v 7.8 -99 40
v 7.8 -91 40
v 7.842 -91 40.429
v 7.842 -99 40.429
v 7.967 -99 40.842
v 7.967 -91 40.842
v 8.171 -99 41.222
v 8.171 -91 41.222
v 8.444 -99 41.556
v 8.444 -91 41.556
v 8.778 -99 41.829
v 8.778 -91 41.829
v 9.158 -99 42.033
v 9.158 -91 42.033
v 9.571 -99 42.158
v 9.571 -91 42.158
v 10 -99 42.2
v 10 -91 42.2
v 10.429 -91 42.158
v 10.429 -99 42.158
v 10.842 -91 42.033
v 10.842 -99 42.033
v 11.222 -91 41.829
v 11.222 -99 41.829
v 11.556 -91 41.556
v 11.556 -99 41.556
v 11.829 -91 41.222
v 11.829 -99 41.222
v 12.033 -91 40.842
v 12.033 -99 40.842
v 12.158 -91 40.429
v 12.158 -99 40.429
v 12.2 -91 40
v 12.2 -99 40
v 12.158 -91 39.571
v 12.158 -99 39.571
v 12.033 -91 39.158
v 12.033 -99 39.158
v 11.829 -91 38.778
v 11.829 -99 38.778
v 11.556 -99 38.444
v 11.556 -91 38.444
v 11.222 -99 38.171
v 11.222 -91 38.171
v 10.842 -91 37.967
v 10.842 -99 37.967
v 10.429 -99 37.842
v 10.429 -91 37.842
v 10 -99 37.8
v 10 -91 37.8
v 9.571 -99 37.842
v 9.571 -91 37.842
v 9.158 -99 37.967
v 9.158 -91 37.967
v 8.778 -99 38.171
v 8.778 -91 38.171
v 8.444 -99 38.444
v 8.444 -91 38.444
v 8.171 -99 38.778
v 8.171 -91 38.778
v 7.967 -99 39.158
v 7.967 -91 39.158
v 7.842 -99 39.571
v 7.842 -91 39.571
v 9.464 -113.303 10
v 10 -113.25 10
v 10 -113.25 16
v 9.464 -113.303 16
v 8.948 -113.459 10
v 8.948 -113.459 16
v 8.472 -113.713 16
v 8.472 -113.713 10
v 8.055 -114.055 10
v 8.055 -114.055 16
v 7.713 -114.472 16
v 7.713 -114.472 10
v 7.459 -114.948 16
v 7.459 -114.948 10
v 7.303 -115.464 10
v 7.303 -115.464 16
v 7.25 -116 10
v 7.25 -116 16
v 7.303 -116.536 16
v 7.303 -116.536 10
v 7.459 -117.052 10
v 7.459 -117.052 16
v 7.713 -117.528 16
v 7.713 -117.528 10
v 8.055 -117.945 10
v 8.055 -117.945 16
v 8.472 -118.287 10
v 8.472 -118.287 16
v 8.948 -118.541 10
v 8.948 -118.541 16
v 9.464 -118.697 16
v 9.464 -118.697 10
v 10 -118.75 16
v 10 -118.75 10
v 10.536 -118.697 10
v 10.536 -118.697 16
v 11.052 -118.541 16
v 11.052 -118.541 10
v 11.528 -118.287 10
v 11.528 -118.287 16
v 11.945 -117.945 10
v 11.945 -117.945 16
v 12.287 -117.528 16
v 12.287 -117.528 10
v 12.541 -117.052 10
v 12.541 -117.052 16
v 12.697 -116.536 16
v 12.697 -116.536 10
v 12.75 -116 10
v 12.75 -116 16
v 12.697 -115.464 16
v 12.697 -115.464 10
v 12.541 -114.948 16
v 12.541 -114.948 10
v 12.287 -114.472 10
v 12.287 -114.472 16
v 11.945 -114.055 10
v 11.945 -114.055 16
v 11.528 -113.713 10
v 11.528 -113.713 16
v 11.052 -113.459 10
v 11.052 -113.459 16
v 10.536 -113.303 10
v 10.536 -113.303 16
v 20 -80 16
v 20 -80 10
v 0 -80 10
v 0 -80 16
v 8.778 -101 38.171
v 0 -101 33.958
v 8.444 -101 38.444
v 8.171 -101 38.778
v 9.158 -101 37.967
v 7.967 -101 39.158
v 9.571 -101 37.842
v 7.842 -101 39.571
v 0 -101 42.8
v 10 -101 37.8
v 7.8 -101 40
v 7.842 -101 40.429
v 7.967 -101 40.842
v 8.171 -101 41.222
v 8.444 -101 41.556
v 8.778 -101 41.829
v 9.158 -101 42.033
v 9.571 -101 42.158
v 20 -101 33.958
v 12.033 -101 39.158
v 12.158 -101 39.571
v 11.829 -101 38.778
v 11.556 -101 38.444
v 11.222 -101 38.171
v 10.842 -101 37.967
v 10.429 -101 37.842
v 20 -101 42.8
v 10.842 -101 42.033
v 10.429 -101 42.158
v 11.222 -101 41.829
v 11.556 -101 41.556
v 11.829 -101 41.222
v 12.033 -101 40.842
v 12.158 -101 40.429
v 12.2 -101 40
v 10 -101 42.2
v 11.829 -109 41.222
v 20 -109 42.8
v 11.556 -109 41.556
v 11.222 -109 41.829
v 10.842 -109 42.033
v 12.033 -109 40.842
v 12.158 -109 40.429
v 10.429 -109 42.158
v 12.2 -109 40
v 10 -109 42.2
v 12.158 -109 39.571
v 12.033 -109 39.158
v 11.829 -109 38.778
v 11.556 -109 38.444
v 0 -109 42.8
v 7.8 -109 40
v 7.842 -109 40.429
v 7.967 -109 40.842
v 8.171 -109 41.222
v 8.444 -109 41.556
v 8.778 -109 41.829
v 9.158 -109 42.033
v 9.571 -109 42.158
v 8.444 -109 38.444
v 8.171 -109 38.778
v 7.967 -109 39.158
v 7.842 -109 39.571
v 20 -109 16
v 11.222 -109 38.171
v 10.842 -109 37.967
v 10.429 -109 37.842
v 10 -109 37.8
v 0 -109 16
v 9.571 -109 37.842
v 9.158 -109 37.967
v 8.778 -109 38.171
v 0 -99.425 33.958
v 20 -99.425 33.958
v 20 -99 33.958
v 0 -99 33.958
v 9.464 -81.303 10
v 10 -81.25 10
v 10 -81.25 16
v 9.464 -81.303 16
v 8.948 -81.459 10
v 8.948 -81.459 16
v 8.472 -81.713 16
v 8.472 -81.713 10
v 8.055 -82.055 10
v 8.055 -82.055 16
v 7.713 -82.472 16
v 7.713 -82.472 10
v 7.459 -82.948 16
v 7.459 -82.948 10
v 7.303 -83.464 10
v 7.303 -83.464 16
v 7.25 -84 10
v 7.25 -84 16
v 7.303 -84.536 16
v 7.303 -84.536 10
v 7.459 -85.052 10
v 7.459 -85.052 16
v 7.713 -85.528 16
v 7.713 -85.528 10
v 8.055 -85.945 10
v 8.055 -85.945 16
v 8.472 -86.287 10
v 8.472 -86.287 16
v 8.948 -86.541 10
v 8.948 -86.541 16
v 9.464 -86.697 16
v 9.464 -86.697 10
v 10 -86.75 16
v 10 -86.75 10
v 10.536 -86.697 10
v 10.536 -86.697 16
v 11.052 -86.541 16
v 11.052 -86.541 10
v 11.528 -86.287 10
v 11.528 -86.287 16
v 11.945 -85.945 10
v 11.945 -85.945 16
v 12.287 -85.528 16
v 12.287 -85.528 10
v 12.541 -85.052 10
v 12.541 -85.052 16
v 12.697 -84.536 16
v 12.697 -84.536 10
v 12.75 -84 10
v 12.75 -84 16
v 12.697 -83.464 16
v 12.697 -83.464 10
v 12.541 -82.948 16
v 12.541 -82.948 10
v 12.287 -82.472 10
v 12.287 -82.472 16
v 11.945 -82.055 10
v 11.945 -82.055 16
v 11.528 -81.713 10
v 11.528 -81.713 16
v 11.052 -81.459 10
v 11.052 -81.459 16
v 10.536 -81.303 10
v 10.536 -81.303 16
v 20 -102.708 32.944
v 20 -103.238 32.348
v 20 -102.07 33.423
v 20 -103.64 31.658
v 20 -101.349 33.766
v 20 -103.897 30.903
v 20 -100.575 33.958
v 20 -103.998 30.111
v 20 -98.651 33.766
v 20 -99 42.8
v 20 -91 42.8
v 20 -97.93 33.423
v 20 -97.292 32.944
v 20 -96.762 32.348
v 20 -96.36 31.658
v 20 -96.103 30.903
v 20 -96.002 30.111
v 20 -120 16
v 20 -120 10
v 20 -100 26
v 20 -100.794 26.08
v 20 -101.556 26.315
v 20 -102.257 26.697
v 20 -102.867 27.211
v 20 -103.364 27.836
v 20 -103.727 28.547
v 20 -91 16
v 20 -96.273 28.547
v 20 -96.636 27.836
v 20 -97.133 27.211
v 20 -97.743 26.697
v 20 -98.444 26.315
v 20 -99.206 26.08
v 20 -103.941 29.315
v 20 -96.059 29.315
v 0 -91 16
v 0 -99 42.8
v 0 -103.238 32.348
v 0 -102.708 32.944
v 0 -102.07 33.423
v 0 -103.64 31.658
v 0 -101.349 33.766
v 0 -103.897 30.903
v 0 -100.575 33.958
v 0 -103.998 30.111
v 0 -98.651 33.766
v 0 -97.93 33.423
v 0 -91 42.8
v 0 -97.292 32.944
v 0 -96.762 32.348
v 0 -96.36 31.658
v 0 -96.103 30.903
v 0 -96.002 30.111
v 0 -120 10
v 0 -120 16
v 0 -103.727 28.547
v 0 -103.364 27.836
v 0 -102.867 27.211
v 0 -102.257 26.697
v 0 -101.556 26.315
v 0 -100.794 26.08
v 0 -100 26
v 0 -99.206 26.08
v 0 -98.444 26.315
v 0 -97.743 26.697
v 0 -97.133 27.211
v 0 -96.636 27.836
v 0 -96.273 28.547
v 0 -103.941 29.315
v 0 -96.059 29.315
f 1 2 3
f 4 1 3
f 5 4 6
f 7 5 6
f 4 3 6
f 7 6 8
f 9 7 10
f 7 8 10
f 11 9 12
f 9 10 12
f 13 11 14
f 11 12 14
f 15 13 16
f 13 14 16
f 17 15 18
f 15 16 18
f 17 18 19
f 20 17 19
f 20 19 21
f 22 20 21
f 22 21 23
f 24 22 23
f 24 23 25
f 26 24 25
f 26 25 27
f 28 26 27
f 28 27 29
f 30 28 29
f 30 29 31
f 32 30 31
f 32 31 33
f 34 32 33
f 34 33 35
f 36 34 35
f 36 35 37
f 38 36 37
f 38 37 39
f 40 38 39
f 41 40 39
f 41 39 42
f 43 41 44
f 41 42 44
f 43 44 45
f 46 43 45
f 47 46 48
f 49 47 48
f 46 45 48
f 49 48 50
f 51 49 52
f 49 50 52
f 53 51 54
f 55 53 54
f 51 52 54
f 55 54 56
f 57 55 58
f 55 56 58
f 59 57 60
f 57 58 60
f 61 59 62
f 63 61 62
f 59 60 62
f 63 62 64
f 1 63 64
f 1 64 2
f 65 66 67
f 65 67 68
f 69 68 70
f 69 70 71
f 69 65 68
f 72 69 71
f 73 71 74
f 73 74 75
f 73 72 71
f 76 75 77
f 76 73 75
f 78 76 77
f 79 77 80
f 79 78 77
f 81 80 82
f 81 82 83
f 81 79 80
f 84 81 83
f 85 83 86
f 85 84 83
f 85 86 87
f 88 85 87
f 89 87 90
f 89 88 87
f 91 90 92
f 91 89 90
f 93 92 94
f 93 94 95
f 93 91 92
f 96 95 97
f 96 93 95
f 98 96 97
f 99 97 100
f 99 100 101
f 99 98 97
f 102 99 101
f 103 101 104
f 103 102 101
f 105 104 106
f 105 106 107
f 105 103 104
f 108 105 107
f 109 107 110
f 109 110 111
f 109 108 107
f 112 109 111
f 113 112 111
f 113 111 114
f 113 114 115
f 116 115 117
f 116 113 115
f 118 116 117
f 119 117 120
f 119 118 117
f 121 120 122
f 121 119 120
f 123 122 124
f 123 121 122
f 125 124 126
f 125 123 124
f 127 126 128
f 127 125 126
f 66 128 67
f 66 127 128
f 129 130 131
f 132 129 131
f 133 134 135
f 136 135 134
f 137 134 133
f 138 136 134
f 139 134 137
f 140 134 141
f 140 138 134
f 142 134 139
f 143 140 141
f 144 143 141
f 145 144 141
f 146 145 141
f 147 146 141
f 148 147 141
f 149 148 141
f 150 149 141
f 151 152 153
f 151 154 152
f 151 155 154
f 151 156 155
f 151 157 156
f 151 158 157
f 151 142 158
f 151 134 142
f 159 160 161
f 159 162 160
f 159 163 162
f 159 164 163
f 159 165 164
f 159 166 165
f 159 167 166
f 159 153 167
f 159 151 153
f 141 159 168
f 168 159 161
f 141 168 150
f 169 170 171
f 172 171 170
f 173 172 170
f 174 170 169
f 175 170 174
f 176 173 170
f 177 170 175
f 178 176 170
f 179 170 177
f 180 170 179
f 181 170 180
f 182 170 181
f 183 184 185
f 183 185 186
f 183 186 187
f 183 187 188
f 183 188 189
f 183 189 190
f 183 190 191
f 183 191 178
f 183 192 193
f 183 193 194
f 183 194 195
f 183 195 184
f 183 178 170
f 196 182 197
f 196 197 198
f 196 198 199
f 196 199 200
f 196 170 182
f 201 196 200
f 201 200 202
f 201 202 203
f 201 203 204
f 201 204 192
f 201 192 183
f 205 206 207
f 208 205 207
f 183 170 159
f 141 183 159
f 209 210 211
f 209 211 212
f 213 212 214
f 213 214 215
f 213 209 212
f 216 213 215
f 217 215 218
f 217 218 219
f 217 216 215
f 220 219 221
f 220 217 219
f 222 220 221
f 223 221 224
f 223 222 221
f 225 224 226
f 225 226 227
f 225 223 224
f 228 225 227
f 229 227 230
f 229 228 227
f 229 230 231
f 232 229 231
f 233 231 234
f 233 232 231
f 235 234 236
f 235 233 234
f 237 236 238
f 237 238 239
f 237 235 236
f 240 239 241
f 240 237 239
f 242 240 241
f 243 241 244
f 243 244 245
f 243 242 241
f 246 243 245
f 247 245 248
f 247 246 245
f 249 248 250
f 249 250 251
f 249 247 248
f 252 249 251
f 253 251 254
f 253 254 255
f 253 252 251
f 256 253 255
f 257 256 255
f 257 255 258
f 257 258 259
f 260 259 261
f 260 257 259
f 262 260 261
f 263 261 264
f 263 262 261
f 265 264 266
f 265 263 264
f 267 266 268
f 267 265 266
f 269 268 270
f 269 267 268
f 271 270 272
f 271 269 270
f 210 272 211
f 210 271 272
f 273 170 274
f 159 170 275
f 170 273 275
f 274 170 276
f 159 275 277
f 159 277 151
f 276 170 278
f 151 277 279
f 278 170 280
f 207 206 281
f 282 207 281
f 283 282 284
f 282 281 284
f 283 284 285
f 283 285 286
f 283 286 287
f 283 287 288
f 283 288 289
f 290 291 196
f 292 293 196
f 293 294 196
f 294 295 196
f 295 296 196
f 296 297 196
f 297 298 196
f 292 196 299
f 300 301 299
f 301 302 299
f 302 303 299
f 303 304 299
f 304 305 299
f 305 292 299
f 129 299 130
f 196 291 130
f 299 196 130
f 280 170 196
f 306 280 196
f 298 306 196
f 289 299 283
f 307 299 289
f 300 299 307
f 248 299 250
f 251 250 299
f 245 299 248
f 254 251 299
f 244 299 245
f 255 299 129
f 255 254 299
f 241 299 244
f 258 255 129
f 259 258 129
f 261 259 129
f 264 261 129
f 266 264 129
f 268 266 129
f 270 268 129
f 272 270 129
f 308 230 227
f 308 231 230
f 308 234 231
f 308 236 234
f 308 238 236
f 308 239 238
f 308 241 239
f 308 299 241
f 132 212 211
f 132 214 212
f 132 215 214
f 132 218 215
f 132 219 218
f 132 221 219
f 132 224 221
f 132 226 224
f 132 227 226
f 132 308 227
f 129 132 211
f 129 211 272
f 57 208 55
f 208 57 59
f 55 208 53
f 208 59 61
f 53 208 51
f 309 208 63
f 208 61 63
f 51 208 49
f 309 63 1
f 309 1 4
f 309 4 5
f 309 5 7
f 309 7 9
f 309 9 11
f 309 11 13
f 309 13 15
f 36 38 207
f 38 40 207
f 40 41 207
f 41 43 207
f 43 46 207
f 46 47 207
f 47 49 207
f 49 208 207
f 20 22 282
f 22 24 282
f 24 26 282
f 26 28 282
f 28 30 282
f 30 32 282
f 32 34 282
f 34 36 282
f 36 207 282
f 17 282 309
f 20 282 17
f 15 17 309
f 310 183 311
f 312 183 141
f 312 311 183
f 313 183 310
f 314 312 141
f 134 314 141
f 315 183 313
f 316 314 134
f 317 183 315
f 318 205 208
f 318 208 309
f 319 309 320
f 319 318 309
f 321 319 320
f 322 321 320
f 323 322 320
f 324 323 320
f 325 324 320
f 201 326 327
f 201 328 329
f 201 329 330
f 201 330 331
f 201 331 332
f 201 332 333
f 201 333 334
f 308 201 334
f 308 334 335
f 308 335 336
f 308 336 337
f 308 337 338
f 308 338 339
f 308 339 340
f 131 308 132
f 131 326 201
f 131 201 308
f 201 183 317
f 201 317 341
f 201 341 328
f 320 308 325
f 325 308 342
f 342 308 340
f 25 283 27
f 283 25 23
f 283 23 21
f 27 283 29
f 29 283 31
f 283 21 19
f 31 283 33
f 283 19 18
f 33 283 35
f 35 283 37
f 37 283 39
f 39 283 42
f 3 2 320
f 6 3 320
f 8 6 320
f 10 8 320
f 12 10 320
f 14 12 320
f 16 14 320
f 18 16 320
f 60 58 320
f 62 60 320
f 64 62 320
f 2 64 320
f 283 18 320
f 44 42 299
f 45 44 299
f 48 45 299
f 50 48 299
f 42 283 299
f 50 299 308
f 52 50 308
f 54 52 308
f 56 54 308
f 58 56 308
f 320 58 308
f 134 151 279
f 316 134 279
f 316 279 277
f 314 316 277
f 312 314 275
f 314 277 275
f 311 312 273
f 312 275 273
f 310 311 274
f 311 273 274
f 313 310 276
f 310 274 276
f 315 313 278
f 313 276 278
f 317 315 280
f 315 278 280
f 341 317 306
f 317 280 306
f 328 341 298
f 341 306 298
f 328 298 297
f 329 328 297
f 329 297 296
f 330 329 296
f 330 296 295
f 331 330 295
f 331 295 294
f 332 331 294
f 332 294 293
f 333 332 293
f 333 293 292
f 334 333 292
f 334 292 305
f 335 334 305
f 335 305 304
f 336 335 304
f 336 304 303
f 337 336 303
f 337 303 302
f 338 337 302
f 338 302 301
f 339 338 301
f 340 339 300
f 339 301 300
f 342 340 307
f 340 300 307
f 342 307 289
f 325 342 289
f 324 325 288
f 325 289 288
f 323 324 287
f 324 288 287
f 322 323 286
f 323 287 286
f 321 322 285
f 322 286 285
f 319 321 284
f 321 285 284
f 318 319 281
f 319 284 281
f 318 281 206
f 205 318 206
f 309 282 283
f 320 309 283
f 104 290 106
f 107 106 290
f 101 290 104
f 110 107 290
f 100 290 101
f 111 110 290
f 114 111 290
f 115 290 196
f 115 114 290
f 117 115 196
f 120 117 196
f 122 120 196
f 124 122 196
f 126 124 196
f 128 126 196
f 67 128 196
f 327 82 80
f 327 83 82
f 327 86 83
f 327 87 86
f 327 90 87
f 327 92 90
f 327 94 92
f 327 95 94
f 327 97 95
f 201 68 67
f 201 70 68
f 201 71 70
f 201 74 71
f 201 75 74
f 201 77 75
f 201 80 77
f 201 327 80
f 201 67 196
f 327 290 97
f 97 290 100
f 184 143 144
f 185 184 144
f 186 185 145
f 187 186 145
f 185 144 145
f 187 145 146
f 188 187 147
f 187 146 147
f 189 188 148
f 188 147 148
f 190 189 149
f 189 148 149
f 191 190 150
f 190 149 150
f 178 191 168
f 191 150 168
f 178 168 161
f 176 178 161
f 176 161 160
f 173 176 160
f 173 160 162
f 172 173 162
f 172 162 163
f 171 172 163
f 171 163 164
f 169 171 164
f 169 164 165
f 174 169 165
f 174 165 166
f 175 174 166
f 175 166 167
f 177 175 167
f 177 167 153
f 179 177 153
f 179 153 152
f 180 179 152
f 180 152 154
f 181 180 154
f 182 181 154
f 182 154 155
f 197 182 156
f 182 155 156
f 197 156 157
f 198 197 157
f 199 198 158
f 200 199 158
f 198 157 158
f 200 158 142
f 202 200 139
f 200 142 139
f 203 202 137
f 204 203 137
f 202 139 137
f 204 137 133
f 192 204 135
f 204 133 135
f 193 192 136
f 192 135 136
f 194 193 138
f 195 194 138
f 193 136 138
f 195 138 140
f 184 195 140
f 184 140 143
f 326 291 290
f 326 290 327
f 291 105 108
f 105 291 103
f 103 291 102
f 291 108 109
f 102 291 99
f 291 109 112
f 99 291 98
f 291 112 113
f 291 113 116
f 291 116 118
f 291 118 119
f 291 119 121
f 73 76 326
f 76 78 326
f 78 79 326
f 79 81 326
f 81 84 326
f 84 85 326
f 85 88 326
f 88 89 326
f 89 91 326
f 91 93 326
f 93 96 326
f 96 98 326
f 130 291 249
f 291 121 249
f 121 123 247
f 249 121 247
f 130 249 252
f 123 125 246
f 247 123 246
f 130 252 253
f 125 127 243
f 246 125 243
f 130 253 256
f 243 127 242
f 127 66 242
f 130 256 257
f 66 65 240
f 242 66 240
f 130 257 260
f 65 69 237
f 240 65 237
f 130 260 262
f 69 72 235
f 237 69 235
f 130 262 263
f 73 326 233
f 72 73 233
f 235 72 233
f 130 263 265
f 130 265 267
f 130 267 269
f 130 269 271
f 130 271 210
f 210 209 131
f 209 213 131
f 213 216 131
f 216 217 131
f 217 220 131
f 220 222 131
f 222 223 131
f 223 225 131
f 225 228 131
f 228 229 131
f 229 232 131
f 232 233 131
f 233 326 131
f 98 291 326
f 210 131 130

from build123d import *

# Parameters (mm, degrees)
SKETCH008_W              = 40
SKETCH008_H              = 20
SKETCH008_R              = 2.75
PAD005_DEPTH             = 6
SKETCH009_W              = 18
SKETCH009_H              = 20
PAD006_DEPTH             = 26.8
SKETCH010_R              = 4
POCKET001_DEPTH          = 20.001
SKETCH011_W              = 2
SKETCH011_H              = 8.8415096984
POCKET002_DEPTH          = 20.001
SKETCH012_R              = 2.2
POCKET003_DEPTH          = 29.001
CLONE011_PLACEMENT_ANGLE = 90


with BuildPart() as part:
    # Sketch008 → Pad005 (new body)
    with BuildSketch(Plane.XY):
        Rectangle(SKETCH008_W, SKETCH008_H)
        with Locations((-16, 0)):
            Circle(SKETCH008_R, mode=Mode.SUBTRACT)
        with Locations((16, 0)):
            Circle(SKETCH008_R, mode=Mode.SUBTRACT)
    extrude(amount=PAD005_DEPTH)

    # Sketch009 (on Face8 of Pad005) → Pad006 (join)
    with BuildSketch(Plane.XY.offset(6)):
        Rectangle(SKETCH009_W, SKETCH009_H)
    extrude(amount=PAD006_DEPTH)

    # Sketch010 (on Face14 of Pad006) → Pocket001 (cut, through all)
    with BuildSketch(Plane.XZ.offset(10)):
        with Locations((0, 20)):
            Circle(SKETCH010_R)
    extrude(amount=-POCKET001_DEPTH, mode=Mode.SUBTRACT)

    # Sketch011 (on Face15 of Pocket001) → Pocket002 (cut, through all)
    with BuildSketch(Plane.XZ.offset(10)):
        with Locations((0, 28.3792451508)):
            Rectangle(SKETCH011_W, SKETCH011_H)
    extrude(amount=-POCKET002_DEPTH, mode=Mode.SUBTRACT)

    # Sketch012 (on Face12 of Pocket002) → Pocket003 (cut, through all)
    with BuildSketch(Plane.YZ.offset(9)):
        with Locations((0, 30)):
            Circle(SKETCH012_R)
    extrude(amount=-POCKET003_DEPTH, mode=Mode.SUBTRACT)


with BuildPart() as part_1:
    # Clone011 placement: moved
    add(part.part.moved(Location((10, -100, 10))).rotate(Axis((10, -100, 10), (0, 0, 1)), CLONE011_PLACEMENT_ANGLE))


solid = part_1.part
